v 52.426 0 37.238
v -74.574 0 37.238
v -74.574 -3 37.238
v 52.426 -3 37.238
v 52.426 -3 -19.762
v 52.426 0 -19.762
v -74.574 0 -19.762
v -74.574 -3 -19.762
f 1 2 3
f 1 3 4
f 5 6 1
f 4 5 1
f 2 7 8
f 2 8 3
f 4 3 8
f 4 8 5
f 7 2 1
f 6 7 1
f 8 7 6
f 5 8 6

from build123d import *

# Parameters (mm, degrees)
F0_W     = 88.9
F0_H     = 63.5
F0_W_2   = 66.04
F0_H_2   = 12.192
F1_DEPTH = 6.35
F3_R     = 60.325
F3_R_2   = 7.9375
F4_DEPTH = 2.54
F6_W     = 127
F6_H     = 57
F7_DEPTH = 3


with BuildPart() as f1:
    # F0 (on Front) → F1 (new body)
    with BuildSketch(Plane.XZ):
        with Locations((10.876595974, 16.1719831105)):
            Rectangle(F0_W, F0_H)
        with Locations((11.8627893072, -0.3107596104)):
            Rectangle(F0_W_2, F0_H_2, mode=Mode.SUBTRACT)
        with Locations((10.9688239437, 30.9780669949)):
            Rectangle(F0_W_2, F0_H_2, mode=Mode.SUBTRACT)
    extrude(amount=F1_DEPTH)


with BuildPart() as f4:
    # F3 (on Front) → F4 (new body)
    with BuildSketch(Plane.XZ):
        with Locations((-8.6416769773, 16.2403918803)):
            Circle(F3_R)
        with Locations((-8.6416769773, 16.2403918803)):
            Circle(F3_R_2, mode=Mode.SUBTRACT)
    extrude(amount=F4_DEPTH)


with BuildPart() as f7:
    # F6 (on Front) → F7 (new body)
    with BuildSketch(Plane.XZ):
        with Locations((-11.0735092312, 8.7383504411)):
            Rectangle(F6_W, F6_H)
    extrude(amount=F7_DEPTH)


solid = f7.part
